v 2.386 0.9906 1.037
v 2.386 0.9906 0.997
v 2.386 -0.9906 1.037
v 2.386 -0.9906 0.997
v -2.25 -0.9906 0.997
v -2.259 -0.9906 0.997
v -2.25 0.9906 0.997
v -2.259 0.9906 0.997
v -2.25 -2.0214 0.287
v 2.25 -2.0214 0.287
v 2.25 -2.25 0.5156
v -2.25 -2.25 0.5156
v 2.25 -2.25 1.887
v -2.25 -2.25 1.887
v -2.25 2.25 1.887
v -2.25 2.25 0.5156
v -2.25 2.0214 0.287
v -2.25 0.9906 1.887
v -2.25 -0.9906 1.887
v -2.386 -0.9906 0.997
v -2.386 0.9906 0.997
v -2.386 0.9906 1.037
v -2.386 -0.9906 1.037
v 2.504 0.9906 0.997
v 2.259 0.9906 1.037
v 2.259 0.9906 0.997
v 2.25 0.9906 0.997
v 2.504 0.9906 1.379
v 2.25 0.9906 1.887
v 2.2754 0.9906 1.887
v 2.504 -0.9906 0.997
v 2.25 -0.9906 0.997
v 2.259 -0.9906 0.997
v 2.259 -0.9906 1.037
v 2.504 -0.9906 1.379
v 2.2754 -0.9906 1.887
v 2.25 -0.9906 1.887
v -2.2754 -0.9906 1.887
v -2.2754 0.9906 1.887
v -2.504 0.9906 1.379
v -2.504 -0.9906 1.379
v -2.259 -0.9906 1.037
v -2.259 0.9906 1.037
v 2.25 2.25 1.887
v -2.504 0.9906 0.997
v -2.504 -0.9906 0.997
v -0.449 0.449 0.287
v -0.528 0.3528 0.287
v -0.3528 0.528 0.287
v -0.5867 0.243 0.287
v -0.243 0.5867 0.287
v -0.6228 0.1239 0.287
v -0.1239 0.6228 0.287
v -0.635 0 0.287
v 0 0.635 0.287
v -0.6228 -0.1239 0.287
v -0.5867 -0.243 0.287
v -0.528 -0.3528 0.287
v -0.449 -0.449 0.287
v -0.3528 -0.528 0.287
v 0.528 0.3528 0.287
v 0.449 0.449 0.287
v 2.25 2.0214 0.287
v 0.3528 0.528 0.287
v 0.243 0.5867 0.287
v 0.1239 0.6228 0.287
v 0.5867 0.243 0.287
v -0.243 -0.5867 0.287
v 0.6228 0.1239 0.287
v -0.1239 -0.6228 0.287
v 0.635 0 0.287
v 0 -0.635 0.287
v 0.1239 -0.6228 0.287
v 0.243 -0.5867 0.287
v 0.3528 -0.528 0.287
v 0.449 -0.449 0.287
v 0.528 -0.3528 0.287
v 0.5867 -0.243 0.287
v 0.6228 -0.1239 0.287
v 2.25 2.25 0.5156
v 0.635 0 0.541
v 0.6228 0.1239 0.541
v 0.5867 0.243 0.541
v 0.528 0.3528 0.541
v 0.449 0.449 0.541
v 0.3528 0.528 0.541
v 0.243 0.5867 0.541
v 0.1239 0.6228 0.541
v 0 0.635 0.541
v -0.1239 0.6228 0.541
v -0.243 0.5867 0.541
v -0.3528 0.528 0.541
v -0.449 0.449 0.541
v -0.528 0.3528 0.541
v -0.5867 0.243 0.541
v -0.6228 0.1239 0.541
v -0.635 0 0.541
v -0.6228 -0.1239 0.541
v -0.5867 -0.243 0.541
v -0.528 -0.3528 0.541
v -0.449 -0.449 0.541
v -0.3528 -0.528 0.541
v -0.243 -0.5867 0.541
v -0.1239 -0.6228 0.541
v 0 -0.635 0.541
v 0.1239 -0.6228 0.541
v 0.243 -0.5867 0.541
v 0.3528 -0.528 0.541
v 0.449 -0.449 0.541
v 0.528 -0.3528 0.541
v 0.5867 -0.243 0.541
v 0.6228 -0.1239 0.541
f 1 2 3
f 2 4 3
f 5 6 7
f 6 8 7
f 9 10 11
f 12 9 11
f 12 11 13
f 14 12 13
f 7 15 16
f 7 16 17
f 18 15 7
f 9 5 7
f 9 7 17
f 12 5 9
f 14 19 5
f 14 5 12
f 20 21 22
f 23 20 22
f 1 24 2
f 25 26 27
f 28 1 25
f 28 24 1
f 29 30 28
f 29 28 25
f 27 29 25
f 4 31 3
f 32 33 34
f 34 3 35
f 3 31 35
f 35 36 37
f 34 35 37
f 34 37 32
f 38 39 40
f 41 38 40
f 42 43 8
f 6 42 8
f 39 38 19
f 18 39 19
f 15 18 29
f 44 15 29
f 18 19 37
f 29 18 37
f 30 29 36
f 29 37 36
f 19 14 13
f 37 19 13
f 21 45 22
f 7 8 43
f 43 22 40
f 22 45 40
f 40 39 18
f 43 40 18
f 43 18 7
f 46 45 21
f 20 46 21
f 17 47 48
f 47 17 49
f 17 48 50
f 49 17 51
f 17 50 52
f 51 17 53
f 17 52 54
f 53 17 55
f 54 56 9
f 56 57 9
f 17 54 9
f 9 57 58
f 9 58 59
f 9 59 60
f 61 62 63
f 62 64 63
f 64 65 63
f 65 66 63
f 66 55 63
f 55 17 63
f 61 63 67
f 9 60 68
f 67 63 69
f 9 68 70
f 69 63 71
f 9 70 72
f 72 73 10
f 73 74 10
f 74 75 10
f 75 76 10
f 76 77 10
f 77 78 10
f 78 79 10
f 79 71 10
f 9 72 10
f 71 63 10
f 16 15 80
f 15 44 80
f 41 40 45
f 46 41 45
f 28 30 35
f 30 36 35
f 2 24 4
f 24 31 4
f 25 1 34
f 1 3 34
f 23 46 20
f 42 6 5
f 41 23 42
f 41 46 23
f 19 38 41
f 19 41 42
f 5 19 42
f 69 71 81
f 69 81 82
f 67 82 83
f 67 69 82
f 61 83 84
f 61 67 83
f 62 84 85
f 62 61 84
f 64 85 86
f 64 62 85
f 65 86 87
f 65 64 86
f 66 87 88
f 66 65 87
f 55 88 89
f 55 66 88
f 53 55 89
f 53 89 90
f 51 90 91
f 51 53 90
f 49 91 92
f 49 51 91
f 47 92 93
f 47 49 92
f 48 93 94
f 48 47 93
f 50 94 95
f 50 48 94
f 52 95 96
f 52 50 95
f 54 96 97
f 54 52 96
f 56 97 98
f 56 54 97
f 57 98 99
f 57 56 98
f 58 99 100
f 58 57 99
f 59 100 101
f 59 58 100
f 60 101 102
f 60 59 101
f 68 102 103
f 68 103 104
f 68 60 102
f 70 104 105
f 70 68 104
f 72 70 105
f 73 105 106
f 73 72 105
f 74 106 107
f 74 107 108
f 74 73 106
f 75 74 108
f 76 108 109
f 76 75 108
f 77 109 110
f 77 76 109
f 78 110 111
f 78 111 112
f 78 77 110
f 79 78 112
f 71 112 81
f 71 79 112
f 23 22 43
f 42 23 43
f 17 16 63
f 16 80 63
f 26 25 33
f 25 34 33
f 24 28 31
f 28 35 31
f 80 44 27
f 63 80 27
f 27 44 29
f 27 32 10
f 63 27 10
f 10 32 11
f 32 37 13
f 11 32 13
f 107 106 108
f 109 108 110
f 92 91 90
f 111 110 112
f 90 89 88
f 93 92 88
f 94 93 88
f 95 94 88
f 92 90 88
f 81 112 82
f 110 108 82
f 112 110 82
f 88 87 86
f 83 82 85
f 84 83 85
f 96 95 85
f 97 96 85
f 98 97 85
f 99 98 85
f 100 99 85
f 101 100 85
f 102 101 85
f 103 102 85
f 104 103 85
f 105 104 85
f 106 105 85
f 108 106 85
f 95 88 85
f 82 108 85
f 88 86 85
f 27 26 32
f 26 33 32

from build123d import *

# Parameters (mm, degrees)
PAD_DEPTH         = 2.25
PAD_DEPTH_BACK    = 2.25
PAD001_DEPTH      = 0.9906
PAD001_DEPTH_BACK = 0.9906
SKETCH002_R       = 0.635
POCKET_DEPTH      = 0.254


with BuildPart() as part:
    # Sketch001 → Pad (new body, two sides)
    with BuildSketch(Plane.YZ) as pad_sk:
        Polygon((-2.25, 1.6), (2.25, 1.6), (2.25, 0.2286), (2.0214, 0), (-2.0214, 0), (-2.25, 0.2286), align=None)
    extrude(amount=PAD_DEPTH)
    extrude(pad_sk.sketch, amount=-PAD_DEPTH_BACK)

    # Sketch → Pad001 (join, two sides)
    with BuildSketch(Plane.XZ) as pad001_sk:
        Polygon((2.25, 1.6), (2.2754, 1.6), (2.504, 1.092), (2.504, 0.71), (2.386, 0.71), (2.386, 0.75), (2.259, 0.75), (2.259, 0.71), (2.25, 0.71), align=None)
    pad001 = extrude(amount=PAD001_DEPTH) + extrude(pad001_sk.sketch, amount=-PAD001_DEPTH_BACK)

    # Mirrored: Pad001 across Sketch V_Axis
    add(pad001.mirror(Plane(origin=(0, 0, 0), x_dir=(0, -1, 0), z_dir=(1, 0, 0))))

    # Sketch002 → Pocket (cut)
    with BuildSketch(Plane.XY):
        Circle(SKETCH002_R)
    extrude(amount=POCKET_DEPTH, mode=Mode.SUBTRACT)


with BuildPart() as part_1:
    # Body placement: moved
    add(part.part.moved(Location((0, 0, 0.287))))


solid = part_1.part
